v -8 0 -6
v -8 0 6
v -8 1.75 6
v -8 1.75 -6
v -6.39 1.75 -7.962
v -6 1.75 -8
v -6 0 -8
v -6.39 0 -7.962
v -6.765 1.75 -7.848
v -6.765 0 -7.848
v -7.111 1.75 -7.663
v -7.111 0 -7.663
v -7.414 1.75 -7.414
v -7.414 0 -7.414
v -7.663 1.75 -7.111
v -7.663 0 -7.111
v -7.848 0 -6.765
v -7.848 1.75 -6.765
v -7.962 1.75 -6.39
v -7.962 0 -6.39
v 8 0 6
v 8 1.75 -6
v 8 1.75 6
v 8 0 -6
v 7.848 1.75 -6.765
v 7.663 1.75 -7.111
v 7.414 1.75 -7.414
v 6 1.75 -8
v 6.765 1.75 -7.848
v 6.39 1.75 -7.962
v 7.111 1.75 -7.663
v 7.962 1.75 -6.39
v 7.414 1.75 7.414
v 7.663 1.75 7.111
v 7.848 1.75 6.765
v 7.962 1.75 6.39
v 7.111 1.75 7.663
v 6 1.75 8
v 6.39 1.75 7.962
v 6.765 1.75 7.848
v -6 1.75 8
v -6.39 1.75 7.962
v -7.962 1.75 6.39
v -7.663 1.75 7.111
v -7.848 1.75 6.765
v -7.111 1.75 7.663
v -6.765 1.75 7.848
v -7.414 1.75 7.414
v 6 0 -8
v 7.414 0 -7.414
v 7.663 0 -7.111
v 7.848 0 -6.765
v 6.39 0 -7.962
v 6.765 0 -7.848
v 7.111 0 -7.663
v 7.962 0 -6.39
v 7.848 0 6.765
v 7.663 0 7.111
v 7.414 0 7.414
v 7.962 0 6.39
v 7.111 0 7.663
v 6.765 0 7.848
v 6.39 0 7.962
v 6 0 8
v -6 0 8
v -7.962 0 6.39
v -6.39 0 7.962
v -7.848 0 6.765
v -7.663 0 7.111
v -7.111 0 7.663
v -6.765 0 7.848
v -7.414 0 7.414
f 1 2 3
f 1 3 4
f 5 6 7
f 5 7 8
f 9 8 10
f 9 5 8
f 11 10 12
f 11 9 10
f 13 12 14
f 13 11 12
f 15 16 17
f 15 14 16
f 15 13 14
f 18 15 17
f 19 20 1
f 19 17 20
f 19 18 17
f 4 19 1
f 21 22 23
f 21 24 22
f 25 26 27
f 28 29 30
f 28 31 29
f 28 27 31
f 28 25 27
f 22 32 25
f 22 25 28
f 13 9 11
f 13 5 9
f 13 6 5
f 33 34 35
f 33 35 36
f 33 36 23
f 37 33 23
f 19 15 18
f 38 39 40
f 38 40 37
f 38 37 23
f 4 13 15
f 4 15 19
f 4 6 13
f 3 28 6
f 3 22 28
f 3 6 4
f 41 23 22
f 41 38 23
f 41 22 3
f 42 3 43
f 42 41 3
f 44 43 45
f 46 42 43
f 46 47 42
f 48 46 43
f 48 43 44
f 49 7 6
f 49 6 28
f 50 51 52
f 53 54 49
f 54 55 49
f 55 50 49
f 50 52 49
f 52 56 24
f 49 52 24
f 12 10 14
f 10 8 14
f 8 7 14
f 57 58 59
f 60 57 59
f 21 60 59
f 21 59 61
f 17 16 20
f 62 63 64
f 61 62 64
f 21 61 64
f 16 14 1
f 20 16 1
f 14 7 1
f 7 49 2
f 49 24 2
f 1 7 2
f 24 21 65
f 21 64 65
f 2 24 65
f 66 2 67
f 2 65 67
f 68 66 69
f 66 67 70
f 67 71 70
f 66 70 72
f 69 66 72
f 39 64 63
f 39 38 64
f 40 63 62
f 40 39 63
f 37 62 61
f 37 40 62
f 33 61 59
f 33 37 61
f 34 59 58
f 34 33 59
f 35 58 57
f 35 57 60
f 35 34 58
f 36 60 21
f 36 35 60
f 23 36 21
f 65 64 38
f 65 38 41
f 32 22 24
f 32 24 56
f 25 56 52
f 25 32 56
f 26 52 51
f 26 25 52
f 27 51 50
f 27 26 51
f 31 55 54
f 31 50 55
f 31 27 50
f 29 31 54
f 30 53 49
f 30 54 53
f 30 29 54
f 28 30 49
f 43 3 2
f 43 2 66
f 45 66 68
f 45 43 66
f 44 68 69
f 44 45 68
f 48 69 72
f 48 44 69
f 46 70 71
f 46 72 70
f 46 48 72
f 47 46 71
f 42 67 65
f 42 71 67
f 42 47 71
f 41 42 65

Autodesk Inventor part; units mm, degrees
ref_plane "YZ Plane" through (0, 0, 0) normal (1, 0, 0) x (0, 1, 0)
ref_plane "XZ Plane" through (0, 0, 0) normal (0, 1, 0) x (-1, 0, 0)
ref_plane "XY Plane" through (0, 0, 0) normal (0, 0, 1) x (1, 0, 0)
sketch "Sketch1" plane through (0, 0, 0) normal (0, 1, 0) x (-1, 0, 0)
  line L0 (-8, 8) -> (8, 8)
  line L1 (8, 8) -> (8, -8)
  line L2 (8, -8) -> (-8, -8)
  line L3 (-8, -8) -> (-8, 8)
  line L4 (-8, 8) -> (8, -8) construction
  line L5 (8, 8) -> (-8, -8) construction
  point P0 (0, 0)
  dimension "d0" = 16
  dimension "d1" = 16
extrude "Extrusion1" add sketch "Sketch1" along normal blind 1.75
fillet "Fillet1" radius 2 4 edges at (-8, 0.875, 8) (8, 0.875, 8) (8, 0.875, -8) (-8, 0.875, -8)
sketch "Sketch2" plane through (0, 1.75, 0) normal (0, 1, 0) x (1, 0, 0)
  line L0 (-8, 8) -> (8, 8) construction
  line L1 (8, 8) -> (8, -8) construction
  line L2 (8, -8) -> (-8, -8) construction
  line L3 (-8, -8) -> (-8, 8) construction
  line L4 (6, 8) -> (-6, 8) projected
  line L5 (-8, 6) -> (-8, -6) projected
  line L6 (8, -6) -> (8, 6) projected
  point P0 (0, 0)
decal "Decal1"
properties part number "Heatsink" material "Aluminum 6061"
